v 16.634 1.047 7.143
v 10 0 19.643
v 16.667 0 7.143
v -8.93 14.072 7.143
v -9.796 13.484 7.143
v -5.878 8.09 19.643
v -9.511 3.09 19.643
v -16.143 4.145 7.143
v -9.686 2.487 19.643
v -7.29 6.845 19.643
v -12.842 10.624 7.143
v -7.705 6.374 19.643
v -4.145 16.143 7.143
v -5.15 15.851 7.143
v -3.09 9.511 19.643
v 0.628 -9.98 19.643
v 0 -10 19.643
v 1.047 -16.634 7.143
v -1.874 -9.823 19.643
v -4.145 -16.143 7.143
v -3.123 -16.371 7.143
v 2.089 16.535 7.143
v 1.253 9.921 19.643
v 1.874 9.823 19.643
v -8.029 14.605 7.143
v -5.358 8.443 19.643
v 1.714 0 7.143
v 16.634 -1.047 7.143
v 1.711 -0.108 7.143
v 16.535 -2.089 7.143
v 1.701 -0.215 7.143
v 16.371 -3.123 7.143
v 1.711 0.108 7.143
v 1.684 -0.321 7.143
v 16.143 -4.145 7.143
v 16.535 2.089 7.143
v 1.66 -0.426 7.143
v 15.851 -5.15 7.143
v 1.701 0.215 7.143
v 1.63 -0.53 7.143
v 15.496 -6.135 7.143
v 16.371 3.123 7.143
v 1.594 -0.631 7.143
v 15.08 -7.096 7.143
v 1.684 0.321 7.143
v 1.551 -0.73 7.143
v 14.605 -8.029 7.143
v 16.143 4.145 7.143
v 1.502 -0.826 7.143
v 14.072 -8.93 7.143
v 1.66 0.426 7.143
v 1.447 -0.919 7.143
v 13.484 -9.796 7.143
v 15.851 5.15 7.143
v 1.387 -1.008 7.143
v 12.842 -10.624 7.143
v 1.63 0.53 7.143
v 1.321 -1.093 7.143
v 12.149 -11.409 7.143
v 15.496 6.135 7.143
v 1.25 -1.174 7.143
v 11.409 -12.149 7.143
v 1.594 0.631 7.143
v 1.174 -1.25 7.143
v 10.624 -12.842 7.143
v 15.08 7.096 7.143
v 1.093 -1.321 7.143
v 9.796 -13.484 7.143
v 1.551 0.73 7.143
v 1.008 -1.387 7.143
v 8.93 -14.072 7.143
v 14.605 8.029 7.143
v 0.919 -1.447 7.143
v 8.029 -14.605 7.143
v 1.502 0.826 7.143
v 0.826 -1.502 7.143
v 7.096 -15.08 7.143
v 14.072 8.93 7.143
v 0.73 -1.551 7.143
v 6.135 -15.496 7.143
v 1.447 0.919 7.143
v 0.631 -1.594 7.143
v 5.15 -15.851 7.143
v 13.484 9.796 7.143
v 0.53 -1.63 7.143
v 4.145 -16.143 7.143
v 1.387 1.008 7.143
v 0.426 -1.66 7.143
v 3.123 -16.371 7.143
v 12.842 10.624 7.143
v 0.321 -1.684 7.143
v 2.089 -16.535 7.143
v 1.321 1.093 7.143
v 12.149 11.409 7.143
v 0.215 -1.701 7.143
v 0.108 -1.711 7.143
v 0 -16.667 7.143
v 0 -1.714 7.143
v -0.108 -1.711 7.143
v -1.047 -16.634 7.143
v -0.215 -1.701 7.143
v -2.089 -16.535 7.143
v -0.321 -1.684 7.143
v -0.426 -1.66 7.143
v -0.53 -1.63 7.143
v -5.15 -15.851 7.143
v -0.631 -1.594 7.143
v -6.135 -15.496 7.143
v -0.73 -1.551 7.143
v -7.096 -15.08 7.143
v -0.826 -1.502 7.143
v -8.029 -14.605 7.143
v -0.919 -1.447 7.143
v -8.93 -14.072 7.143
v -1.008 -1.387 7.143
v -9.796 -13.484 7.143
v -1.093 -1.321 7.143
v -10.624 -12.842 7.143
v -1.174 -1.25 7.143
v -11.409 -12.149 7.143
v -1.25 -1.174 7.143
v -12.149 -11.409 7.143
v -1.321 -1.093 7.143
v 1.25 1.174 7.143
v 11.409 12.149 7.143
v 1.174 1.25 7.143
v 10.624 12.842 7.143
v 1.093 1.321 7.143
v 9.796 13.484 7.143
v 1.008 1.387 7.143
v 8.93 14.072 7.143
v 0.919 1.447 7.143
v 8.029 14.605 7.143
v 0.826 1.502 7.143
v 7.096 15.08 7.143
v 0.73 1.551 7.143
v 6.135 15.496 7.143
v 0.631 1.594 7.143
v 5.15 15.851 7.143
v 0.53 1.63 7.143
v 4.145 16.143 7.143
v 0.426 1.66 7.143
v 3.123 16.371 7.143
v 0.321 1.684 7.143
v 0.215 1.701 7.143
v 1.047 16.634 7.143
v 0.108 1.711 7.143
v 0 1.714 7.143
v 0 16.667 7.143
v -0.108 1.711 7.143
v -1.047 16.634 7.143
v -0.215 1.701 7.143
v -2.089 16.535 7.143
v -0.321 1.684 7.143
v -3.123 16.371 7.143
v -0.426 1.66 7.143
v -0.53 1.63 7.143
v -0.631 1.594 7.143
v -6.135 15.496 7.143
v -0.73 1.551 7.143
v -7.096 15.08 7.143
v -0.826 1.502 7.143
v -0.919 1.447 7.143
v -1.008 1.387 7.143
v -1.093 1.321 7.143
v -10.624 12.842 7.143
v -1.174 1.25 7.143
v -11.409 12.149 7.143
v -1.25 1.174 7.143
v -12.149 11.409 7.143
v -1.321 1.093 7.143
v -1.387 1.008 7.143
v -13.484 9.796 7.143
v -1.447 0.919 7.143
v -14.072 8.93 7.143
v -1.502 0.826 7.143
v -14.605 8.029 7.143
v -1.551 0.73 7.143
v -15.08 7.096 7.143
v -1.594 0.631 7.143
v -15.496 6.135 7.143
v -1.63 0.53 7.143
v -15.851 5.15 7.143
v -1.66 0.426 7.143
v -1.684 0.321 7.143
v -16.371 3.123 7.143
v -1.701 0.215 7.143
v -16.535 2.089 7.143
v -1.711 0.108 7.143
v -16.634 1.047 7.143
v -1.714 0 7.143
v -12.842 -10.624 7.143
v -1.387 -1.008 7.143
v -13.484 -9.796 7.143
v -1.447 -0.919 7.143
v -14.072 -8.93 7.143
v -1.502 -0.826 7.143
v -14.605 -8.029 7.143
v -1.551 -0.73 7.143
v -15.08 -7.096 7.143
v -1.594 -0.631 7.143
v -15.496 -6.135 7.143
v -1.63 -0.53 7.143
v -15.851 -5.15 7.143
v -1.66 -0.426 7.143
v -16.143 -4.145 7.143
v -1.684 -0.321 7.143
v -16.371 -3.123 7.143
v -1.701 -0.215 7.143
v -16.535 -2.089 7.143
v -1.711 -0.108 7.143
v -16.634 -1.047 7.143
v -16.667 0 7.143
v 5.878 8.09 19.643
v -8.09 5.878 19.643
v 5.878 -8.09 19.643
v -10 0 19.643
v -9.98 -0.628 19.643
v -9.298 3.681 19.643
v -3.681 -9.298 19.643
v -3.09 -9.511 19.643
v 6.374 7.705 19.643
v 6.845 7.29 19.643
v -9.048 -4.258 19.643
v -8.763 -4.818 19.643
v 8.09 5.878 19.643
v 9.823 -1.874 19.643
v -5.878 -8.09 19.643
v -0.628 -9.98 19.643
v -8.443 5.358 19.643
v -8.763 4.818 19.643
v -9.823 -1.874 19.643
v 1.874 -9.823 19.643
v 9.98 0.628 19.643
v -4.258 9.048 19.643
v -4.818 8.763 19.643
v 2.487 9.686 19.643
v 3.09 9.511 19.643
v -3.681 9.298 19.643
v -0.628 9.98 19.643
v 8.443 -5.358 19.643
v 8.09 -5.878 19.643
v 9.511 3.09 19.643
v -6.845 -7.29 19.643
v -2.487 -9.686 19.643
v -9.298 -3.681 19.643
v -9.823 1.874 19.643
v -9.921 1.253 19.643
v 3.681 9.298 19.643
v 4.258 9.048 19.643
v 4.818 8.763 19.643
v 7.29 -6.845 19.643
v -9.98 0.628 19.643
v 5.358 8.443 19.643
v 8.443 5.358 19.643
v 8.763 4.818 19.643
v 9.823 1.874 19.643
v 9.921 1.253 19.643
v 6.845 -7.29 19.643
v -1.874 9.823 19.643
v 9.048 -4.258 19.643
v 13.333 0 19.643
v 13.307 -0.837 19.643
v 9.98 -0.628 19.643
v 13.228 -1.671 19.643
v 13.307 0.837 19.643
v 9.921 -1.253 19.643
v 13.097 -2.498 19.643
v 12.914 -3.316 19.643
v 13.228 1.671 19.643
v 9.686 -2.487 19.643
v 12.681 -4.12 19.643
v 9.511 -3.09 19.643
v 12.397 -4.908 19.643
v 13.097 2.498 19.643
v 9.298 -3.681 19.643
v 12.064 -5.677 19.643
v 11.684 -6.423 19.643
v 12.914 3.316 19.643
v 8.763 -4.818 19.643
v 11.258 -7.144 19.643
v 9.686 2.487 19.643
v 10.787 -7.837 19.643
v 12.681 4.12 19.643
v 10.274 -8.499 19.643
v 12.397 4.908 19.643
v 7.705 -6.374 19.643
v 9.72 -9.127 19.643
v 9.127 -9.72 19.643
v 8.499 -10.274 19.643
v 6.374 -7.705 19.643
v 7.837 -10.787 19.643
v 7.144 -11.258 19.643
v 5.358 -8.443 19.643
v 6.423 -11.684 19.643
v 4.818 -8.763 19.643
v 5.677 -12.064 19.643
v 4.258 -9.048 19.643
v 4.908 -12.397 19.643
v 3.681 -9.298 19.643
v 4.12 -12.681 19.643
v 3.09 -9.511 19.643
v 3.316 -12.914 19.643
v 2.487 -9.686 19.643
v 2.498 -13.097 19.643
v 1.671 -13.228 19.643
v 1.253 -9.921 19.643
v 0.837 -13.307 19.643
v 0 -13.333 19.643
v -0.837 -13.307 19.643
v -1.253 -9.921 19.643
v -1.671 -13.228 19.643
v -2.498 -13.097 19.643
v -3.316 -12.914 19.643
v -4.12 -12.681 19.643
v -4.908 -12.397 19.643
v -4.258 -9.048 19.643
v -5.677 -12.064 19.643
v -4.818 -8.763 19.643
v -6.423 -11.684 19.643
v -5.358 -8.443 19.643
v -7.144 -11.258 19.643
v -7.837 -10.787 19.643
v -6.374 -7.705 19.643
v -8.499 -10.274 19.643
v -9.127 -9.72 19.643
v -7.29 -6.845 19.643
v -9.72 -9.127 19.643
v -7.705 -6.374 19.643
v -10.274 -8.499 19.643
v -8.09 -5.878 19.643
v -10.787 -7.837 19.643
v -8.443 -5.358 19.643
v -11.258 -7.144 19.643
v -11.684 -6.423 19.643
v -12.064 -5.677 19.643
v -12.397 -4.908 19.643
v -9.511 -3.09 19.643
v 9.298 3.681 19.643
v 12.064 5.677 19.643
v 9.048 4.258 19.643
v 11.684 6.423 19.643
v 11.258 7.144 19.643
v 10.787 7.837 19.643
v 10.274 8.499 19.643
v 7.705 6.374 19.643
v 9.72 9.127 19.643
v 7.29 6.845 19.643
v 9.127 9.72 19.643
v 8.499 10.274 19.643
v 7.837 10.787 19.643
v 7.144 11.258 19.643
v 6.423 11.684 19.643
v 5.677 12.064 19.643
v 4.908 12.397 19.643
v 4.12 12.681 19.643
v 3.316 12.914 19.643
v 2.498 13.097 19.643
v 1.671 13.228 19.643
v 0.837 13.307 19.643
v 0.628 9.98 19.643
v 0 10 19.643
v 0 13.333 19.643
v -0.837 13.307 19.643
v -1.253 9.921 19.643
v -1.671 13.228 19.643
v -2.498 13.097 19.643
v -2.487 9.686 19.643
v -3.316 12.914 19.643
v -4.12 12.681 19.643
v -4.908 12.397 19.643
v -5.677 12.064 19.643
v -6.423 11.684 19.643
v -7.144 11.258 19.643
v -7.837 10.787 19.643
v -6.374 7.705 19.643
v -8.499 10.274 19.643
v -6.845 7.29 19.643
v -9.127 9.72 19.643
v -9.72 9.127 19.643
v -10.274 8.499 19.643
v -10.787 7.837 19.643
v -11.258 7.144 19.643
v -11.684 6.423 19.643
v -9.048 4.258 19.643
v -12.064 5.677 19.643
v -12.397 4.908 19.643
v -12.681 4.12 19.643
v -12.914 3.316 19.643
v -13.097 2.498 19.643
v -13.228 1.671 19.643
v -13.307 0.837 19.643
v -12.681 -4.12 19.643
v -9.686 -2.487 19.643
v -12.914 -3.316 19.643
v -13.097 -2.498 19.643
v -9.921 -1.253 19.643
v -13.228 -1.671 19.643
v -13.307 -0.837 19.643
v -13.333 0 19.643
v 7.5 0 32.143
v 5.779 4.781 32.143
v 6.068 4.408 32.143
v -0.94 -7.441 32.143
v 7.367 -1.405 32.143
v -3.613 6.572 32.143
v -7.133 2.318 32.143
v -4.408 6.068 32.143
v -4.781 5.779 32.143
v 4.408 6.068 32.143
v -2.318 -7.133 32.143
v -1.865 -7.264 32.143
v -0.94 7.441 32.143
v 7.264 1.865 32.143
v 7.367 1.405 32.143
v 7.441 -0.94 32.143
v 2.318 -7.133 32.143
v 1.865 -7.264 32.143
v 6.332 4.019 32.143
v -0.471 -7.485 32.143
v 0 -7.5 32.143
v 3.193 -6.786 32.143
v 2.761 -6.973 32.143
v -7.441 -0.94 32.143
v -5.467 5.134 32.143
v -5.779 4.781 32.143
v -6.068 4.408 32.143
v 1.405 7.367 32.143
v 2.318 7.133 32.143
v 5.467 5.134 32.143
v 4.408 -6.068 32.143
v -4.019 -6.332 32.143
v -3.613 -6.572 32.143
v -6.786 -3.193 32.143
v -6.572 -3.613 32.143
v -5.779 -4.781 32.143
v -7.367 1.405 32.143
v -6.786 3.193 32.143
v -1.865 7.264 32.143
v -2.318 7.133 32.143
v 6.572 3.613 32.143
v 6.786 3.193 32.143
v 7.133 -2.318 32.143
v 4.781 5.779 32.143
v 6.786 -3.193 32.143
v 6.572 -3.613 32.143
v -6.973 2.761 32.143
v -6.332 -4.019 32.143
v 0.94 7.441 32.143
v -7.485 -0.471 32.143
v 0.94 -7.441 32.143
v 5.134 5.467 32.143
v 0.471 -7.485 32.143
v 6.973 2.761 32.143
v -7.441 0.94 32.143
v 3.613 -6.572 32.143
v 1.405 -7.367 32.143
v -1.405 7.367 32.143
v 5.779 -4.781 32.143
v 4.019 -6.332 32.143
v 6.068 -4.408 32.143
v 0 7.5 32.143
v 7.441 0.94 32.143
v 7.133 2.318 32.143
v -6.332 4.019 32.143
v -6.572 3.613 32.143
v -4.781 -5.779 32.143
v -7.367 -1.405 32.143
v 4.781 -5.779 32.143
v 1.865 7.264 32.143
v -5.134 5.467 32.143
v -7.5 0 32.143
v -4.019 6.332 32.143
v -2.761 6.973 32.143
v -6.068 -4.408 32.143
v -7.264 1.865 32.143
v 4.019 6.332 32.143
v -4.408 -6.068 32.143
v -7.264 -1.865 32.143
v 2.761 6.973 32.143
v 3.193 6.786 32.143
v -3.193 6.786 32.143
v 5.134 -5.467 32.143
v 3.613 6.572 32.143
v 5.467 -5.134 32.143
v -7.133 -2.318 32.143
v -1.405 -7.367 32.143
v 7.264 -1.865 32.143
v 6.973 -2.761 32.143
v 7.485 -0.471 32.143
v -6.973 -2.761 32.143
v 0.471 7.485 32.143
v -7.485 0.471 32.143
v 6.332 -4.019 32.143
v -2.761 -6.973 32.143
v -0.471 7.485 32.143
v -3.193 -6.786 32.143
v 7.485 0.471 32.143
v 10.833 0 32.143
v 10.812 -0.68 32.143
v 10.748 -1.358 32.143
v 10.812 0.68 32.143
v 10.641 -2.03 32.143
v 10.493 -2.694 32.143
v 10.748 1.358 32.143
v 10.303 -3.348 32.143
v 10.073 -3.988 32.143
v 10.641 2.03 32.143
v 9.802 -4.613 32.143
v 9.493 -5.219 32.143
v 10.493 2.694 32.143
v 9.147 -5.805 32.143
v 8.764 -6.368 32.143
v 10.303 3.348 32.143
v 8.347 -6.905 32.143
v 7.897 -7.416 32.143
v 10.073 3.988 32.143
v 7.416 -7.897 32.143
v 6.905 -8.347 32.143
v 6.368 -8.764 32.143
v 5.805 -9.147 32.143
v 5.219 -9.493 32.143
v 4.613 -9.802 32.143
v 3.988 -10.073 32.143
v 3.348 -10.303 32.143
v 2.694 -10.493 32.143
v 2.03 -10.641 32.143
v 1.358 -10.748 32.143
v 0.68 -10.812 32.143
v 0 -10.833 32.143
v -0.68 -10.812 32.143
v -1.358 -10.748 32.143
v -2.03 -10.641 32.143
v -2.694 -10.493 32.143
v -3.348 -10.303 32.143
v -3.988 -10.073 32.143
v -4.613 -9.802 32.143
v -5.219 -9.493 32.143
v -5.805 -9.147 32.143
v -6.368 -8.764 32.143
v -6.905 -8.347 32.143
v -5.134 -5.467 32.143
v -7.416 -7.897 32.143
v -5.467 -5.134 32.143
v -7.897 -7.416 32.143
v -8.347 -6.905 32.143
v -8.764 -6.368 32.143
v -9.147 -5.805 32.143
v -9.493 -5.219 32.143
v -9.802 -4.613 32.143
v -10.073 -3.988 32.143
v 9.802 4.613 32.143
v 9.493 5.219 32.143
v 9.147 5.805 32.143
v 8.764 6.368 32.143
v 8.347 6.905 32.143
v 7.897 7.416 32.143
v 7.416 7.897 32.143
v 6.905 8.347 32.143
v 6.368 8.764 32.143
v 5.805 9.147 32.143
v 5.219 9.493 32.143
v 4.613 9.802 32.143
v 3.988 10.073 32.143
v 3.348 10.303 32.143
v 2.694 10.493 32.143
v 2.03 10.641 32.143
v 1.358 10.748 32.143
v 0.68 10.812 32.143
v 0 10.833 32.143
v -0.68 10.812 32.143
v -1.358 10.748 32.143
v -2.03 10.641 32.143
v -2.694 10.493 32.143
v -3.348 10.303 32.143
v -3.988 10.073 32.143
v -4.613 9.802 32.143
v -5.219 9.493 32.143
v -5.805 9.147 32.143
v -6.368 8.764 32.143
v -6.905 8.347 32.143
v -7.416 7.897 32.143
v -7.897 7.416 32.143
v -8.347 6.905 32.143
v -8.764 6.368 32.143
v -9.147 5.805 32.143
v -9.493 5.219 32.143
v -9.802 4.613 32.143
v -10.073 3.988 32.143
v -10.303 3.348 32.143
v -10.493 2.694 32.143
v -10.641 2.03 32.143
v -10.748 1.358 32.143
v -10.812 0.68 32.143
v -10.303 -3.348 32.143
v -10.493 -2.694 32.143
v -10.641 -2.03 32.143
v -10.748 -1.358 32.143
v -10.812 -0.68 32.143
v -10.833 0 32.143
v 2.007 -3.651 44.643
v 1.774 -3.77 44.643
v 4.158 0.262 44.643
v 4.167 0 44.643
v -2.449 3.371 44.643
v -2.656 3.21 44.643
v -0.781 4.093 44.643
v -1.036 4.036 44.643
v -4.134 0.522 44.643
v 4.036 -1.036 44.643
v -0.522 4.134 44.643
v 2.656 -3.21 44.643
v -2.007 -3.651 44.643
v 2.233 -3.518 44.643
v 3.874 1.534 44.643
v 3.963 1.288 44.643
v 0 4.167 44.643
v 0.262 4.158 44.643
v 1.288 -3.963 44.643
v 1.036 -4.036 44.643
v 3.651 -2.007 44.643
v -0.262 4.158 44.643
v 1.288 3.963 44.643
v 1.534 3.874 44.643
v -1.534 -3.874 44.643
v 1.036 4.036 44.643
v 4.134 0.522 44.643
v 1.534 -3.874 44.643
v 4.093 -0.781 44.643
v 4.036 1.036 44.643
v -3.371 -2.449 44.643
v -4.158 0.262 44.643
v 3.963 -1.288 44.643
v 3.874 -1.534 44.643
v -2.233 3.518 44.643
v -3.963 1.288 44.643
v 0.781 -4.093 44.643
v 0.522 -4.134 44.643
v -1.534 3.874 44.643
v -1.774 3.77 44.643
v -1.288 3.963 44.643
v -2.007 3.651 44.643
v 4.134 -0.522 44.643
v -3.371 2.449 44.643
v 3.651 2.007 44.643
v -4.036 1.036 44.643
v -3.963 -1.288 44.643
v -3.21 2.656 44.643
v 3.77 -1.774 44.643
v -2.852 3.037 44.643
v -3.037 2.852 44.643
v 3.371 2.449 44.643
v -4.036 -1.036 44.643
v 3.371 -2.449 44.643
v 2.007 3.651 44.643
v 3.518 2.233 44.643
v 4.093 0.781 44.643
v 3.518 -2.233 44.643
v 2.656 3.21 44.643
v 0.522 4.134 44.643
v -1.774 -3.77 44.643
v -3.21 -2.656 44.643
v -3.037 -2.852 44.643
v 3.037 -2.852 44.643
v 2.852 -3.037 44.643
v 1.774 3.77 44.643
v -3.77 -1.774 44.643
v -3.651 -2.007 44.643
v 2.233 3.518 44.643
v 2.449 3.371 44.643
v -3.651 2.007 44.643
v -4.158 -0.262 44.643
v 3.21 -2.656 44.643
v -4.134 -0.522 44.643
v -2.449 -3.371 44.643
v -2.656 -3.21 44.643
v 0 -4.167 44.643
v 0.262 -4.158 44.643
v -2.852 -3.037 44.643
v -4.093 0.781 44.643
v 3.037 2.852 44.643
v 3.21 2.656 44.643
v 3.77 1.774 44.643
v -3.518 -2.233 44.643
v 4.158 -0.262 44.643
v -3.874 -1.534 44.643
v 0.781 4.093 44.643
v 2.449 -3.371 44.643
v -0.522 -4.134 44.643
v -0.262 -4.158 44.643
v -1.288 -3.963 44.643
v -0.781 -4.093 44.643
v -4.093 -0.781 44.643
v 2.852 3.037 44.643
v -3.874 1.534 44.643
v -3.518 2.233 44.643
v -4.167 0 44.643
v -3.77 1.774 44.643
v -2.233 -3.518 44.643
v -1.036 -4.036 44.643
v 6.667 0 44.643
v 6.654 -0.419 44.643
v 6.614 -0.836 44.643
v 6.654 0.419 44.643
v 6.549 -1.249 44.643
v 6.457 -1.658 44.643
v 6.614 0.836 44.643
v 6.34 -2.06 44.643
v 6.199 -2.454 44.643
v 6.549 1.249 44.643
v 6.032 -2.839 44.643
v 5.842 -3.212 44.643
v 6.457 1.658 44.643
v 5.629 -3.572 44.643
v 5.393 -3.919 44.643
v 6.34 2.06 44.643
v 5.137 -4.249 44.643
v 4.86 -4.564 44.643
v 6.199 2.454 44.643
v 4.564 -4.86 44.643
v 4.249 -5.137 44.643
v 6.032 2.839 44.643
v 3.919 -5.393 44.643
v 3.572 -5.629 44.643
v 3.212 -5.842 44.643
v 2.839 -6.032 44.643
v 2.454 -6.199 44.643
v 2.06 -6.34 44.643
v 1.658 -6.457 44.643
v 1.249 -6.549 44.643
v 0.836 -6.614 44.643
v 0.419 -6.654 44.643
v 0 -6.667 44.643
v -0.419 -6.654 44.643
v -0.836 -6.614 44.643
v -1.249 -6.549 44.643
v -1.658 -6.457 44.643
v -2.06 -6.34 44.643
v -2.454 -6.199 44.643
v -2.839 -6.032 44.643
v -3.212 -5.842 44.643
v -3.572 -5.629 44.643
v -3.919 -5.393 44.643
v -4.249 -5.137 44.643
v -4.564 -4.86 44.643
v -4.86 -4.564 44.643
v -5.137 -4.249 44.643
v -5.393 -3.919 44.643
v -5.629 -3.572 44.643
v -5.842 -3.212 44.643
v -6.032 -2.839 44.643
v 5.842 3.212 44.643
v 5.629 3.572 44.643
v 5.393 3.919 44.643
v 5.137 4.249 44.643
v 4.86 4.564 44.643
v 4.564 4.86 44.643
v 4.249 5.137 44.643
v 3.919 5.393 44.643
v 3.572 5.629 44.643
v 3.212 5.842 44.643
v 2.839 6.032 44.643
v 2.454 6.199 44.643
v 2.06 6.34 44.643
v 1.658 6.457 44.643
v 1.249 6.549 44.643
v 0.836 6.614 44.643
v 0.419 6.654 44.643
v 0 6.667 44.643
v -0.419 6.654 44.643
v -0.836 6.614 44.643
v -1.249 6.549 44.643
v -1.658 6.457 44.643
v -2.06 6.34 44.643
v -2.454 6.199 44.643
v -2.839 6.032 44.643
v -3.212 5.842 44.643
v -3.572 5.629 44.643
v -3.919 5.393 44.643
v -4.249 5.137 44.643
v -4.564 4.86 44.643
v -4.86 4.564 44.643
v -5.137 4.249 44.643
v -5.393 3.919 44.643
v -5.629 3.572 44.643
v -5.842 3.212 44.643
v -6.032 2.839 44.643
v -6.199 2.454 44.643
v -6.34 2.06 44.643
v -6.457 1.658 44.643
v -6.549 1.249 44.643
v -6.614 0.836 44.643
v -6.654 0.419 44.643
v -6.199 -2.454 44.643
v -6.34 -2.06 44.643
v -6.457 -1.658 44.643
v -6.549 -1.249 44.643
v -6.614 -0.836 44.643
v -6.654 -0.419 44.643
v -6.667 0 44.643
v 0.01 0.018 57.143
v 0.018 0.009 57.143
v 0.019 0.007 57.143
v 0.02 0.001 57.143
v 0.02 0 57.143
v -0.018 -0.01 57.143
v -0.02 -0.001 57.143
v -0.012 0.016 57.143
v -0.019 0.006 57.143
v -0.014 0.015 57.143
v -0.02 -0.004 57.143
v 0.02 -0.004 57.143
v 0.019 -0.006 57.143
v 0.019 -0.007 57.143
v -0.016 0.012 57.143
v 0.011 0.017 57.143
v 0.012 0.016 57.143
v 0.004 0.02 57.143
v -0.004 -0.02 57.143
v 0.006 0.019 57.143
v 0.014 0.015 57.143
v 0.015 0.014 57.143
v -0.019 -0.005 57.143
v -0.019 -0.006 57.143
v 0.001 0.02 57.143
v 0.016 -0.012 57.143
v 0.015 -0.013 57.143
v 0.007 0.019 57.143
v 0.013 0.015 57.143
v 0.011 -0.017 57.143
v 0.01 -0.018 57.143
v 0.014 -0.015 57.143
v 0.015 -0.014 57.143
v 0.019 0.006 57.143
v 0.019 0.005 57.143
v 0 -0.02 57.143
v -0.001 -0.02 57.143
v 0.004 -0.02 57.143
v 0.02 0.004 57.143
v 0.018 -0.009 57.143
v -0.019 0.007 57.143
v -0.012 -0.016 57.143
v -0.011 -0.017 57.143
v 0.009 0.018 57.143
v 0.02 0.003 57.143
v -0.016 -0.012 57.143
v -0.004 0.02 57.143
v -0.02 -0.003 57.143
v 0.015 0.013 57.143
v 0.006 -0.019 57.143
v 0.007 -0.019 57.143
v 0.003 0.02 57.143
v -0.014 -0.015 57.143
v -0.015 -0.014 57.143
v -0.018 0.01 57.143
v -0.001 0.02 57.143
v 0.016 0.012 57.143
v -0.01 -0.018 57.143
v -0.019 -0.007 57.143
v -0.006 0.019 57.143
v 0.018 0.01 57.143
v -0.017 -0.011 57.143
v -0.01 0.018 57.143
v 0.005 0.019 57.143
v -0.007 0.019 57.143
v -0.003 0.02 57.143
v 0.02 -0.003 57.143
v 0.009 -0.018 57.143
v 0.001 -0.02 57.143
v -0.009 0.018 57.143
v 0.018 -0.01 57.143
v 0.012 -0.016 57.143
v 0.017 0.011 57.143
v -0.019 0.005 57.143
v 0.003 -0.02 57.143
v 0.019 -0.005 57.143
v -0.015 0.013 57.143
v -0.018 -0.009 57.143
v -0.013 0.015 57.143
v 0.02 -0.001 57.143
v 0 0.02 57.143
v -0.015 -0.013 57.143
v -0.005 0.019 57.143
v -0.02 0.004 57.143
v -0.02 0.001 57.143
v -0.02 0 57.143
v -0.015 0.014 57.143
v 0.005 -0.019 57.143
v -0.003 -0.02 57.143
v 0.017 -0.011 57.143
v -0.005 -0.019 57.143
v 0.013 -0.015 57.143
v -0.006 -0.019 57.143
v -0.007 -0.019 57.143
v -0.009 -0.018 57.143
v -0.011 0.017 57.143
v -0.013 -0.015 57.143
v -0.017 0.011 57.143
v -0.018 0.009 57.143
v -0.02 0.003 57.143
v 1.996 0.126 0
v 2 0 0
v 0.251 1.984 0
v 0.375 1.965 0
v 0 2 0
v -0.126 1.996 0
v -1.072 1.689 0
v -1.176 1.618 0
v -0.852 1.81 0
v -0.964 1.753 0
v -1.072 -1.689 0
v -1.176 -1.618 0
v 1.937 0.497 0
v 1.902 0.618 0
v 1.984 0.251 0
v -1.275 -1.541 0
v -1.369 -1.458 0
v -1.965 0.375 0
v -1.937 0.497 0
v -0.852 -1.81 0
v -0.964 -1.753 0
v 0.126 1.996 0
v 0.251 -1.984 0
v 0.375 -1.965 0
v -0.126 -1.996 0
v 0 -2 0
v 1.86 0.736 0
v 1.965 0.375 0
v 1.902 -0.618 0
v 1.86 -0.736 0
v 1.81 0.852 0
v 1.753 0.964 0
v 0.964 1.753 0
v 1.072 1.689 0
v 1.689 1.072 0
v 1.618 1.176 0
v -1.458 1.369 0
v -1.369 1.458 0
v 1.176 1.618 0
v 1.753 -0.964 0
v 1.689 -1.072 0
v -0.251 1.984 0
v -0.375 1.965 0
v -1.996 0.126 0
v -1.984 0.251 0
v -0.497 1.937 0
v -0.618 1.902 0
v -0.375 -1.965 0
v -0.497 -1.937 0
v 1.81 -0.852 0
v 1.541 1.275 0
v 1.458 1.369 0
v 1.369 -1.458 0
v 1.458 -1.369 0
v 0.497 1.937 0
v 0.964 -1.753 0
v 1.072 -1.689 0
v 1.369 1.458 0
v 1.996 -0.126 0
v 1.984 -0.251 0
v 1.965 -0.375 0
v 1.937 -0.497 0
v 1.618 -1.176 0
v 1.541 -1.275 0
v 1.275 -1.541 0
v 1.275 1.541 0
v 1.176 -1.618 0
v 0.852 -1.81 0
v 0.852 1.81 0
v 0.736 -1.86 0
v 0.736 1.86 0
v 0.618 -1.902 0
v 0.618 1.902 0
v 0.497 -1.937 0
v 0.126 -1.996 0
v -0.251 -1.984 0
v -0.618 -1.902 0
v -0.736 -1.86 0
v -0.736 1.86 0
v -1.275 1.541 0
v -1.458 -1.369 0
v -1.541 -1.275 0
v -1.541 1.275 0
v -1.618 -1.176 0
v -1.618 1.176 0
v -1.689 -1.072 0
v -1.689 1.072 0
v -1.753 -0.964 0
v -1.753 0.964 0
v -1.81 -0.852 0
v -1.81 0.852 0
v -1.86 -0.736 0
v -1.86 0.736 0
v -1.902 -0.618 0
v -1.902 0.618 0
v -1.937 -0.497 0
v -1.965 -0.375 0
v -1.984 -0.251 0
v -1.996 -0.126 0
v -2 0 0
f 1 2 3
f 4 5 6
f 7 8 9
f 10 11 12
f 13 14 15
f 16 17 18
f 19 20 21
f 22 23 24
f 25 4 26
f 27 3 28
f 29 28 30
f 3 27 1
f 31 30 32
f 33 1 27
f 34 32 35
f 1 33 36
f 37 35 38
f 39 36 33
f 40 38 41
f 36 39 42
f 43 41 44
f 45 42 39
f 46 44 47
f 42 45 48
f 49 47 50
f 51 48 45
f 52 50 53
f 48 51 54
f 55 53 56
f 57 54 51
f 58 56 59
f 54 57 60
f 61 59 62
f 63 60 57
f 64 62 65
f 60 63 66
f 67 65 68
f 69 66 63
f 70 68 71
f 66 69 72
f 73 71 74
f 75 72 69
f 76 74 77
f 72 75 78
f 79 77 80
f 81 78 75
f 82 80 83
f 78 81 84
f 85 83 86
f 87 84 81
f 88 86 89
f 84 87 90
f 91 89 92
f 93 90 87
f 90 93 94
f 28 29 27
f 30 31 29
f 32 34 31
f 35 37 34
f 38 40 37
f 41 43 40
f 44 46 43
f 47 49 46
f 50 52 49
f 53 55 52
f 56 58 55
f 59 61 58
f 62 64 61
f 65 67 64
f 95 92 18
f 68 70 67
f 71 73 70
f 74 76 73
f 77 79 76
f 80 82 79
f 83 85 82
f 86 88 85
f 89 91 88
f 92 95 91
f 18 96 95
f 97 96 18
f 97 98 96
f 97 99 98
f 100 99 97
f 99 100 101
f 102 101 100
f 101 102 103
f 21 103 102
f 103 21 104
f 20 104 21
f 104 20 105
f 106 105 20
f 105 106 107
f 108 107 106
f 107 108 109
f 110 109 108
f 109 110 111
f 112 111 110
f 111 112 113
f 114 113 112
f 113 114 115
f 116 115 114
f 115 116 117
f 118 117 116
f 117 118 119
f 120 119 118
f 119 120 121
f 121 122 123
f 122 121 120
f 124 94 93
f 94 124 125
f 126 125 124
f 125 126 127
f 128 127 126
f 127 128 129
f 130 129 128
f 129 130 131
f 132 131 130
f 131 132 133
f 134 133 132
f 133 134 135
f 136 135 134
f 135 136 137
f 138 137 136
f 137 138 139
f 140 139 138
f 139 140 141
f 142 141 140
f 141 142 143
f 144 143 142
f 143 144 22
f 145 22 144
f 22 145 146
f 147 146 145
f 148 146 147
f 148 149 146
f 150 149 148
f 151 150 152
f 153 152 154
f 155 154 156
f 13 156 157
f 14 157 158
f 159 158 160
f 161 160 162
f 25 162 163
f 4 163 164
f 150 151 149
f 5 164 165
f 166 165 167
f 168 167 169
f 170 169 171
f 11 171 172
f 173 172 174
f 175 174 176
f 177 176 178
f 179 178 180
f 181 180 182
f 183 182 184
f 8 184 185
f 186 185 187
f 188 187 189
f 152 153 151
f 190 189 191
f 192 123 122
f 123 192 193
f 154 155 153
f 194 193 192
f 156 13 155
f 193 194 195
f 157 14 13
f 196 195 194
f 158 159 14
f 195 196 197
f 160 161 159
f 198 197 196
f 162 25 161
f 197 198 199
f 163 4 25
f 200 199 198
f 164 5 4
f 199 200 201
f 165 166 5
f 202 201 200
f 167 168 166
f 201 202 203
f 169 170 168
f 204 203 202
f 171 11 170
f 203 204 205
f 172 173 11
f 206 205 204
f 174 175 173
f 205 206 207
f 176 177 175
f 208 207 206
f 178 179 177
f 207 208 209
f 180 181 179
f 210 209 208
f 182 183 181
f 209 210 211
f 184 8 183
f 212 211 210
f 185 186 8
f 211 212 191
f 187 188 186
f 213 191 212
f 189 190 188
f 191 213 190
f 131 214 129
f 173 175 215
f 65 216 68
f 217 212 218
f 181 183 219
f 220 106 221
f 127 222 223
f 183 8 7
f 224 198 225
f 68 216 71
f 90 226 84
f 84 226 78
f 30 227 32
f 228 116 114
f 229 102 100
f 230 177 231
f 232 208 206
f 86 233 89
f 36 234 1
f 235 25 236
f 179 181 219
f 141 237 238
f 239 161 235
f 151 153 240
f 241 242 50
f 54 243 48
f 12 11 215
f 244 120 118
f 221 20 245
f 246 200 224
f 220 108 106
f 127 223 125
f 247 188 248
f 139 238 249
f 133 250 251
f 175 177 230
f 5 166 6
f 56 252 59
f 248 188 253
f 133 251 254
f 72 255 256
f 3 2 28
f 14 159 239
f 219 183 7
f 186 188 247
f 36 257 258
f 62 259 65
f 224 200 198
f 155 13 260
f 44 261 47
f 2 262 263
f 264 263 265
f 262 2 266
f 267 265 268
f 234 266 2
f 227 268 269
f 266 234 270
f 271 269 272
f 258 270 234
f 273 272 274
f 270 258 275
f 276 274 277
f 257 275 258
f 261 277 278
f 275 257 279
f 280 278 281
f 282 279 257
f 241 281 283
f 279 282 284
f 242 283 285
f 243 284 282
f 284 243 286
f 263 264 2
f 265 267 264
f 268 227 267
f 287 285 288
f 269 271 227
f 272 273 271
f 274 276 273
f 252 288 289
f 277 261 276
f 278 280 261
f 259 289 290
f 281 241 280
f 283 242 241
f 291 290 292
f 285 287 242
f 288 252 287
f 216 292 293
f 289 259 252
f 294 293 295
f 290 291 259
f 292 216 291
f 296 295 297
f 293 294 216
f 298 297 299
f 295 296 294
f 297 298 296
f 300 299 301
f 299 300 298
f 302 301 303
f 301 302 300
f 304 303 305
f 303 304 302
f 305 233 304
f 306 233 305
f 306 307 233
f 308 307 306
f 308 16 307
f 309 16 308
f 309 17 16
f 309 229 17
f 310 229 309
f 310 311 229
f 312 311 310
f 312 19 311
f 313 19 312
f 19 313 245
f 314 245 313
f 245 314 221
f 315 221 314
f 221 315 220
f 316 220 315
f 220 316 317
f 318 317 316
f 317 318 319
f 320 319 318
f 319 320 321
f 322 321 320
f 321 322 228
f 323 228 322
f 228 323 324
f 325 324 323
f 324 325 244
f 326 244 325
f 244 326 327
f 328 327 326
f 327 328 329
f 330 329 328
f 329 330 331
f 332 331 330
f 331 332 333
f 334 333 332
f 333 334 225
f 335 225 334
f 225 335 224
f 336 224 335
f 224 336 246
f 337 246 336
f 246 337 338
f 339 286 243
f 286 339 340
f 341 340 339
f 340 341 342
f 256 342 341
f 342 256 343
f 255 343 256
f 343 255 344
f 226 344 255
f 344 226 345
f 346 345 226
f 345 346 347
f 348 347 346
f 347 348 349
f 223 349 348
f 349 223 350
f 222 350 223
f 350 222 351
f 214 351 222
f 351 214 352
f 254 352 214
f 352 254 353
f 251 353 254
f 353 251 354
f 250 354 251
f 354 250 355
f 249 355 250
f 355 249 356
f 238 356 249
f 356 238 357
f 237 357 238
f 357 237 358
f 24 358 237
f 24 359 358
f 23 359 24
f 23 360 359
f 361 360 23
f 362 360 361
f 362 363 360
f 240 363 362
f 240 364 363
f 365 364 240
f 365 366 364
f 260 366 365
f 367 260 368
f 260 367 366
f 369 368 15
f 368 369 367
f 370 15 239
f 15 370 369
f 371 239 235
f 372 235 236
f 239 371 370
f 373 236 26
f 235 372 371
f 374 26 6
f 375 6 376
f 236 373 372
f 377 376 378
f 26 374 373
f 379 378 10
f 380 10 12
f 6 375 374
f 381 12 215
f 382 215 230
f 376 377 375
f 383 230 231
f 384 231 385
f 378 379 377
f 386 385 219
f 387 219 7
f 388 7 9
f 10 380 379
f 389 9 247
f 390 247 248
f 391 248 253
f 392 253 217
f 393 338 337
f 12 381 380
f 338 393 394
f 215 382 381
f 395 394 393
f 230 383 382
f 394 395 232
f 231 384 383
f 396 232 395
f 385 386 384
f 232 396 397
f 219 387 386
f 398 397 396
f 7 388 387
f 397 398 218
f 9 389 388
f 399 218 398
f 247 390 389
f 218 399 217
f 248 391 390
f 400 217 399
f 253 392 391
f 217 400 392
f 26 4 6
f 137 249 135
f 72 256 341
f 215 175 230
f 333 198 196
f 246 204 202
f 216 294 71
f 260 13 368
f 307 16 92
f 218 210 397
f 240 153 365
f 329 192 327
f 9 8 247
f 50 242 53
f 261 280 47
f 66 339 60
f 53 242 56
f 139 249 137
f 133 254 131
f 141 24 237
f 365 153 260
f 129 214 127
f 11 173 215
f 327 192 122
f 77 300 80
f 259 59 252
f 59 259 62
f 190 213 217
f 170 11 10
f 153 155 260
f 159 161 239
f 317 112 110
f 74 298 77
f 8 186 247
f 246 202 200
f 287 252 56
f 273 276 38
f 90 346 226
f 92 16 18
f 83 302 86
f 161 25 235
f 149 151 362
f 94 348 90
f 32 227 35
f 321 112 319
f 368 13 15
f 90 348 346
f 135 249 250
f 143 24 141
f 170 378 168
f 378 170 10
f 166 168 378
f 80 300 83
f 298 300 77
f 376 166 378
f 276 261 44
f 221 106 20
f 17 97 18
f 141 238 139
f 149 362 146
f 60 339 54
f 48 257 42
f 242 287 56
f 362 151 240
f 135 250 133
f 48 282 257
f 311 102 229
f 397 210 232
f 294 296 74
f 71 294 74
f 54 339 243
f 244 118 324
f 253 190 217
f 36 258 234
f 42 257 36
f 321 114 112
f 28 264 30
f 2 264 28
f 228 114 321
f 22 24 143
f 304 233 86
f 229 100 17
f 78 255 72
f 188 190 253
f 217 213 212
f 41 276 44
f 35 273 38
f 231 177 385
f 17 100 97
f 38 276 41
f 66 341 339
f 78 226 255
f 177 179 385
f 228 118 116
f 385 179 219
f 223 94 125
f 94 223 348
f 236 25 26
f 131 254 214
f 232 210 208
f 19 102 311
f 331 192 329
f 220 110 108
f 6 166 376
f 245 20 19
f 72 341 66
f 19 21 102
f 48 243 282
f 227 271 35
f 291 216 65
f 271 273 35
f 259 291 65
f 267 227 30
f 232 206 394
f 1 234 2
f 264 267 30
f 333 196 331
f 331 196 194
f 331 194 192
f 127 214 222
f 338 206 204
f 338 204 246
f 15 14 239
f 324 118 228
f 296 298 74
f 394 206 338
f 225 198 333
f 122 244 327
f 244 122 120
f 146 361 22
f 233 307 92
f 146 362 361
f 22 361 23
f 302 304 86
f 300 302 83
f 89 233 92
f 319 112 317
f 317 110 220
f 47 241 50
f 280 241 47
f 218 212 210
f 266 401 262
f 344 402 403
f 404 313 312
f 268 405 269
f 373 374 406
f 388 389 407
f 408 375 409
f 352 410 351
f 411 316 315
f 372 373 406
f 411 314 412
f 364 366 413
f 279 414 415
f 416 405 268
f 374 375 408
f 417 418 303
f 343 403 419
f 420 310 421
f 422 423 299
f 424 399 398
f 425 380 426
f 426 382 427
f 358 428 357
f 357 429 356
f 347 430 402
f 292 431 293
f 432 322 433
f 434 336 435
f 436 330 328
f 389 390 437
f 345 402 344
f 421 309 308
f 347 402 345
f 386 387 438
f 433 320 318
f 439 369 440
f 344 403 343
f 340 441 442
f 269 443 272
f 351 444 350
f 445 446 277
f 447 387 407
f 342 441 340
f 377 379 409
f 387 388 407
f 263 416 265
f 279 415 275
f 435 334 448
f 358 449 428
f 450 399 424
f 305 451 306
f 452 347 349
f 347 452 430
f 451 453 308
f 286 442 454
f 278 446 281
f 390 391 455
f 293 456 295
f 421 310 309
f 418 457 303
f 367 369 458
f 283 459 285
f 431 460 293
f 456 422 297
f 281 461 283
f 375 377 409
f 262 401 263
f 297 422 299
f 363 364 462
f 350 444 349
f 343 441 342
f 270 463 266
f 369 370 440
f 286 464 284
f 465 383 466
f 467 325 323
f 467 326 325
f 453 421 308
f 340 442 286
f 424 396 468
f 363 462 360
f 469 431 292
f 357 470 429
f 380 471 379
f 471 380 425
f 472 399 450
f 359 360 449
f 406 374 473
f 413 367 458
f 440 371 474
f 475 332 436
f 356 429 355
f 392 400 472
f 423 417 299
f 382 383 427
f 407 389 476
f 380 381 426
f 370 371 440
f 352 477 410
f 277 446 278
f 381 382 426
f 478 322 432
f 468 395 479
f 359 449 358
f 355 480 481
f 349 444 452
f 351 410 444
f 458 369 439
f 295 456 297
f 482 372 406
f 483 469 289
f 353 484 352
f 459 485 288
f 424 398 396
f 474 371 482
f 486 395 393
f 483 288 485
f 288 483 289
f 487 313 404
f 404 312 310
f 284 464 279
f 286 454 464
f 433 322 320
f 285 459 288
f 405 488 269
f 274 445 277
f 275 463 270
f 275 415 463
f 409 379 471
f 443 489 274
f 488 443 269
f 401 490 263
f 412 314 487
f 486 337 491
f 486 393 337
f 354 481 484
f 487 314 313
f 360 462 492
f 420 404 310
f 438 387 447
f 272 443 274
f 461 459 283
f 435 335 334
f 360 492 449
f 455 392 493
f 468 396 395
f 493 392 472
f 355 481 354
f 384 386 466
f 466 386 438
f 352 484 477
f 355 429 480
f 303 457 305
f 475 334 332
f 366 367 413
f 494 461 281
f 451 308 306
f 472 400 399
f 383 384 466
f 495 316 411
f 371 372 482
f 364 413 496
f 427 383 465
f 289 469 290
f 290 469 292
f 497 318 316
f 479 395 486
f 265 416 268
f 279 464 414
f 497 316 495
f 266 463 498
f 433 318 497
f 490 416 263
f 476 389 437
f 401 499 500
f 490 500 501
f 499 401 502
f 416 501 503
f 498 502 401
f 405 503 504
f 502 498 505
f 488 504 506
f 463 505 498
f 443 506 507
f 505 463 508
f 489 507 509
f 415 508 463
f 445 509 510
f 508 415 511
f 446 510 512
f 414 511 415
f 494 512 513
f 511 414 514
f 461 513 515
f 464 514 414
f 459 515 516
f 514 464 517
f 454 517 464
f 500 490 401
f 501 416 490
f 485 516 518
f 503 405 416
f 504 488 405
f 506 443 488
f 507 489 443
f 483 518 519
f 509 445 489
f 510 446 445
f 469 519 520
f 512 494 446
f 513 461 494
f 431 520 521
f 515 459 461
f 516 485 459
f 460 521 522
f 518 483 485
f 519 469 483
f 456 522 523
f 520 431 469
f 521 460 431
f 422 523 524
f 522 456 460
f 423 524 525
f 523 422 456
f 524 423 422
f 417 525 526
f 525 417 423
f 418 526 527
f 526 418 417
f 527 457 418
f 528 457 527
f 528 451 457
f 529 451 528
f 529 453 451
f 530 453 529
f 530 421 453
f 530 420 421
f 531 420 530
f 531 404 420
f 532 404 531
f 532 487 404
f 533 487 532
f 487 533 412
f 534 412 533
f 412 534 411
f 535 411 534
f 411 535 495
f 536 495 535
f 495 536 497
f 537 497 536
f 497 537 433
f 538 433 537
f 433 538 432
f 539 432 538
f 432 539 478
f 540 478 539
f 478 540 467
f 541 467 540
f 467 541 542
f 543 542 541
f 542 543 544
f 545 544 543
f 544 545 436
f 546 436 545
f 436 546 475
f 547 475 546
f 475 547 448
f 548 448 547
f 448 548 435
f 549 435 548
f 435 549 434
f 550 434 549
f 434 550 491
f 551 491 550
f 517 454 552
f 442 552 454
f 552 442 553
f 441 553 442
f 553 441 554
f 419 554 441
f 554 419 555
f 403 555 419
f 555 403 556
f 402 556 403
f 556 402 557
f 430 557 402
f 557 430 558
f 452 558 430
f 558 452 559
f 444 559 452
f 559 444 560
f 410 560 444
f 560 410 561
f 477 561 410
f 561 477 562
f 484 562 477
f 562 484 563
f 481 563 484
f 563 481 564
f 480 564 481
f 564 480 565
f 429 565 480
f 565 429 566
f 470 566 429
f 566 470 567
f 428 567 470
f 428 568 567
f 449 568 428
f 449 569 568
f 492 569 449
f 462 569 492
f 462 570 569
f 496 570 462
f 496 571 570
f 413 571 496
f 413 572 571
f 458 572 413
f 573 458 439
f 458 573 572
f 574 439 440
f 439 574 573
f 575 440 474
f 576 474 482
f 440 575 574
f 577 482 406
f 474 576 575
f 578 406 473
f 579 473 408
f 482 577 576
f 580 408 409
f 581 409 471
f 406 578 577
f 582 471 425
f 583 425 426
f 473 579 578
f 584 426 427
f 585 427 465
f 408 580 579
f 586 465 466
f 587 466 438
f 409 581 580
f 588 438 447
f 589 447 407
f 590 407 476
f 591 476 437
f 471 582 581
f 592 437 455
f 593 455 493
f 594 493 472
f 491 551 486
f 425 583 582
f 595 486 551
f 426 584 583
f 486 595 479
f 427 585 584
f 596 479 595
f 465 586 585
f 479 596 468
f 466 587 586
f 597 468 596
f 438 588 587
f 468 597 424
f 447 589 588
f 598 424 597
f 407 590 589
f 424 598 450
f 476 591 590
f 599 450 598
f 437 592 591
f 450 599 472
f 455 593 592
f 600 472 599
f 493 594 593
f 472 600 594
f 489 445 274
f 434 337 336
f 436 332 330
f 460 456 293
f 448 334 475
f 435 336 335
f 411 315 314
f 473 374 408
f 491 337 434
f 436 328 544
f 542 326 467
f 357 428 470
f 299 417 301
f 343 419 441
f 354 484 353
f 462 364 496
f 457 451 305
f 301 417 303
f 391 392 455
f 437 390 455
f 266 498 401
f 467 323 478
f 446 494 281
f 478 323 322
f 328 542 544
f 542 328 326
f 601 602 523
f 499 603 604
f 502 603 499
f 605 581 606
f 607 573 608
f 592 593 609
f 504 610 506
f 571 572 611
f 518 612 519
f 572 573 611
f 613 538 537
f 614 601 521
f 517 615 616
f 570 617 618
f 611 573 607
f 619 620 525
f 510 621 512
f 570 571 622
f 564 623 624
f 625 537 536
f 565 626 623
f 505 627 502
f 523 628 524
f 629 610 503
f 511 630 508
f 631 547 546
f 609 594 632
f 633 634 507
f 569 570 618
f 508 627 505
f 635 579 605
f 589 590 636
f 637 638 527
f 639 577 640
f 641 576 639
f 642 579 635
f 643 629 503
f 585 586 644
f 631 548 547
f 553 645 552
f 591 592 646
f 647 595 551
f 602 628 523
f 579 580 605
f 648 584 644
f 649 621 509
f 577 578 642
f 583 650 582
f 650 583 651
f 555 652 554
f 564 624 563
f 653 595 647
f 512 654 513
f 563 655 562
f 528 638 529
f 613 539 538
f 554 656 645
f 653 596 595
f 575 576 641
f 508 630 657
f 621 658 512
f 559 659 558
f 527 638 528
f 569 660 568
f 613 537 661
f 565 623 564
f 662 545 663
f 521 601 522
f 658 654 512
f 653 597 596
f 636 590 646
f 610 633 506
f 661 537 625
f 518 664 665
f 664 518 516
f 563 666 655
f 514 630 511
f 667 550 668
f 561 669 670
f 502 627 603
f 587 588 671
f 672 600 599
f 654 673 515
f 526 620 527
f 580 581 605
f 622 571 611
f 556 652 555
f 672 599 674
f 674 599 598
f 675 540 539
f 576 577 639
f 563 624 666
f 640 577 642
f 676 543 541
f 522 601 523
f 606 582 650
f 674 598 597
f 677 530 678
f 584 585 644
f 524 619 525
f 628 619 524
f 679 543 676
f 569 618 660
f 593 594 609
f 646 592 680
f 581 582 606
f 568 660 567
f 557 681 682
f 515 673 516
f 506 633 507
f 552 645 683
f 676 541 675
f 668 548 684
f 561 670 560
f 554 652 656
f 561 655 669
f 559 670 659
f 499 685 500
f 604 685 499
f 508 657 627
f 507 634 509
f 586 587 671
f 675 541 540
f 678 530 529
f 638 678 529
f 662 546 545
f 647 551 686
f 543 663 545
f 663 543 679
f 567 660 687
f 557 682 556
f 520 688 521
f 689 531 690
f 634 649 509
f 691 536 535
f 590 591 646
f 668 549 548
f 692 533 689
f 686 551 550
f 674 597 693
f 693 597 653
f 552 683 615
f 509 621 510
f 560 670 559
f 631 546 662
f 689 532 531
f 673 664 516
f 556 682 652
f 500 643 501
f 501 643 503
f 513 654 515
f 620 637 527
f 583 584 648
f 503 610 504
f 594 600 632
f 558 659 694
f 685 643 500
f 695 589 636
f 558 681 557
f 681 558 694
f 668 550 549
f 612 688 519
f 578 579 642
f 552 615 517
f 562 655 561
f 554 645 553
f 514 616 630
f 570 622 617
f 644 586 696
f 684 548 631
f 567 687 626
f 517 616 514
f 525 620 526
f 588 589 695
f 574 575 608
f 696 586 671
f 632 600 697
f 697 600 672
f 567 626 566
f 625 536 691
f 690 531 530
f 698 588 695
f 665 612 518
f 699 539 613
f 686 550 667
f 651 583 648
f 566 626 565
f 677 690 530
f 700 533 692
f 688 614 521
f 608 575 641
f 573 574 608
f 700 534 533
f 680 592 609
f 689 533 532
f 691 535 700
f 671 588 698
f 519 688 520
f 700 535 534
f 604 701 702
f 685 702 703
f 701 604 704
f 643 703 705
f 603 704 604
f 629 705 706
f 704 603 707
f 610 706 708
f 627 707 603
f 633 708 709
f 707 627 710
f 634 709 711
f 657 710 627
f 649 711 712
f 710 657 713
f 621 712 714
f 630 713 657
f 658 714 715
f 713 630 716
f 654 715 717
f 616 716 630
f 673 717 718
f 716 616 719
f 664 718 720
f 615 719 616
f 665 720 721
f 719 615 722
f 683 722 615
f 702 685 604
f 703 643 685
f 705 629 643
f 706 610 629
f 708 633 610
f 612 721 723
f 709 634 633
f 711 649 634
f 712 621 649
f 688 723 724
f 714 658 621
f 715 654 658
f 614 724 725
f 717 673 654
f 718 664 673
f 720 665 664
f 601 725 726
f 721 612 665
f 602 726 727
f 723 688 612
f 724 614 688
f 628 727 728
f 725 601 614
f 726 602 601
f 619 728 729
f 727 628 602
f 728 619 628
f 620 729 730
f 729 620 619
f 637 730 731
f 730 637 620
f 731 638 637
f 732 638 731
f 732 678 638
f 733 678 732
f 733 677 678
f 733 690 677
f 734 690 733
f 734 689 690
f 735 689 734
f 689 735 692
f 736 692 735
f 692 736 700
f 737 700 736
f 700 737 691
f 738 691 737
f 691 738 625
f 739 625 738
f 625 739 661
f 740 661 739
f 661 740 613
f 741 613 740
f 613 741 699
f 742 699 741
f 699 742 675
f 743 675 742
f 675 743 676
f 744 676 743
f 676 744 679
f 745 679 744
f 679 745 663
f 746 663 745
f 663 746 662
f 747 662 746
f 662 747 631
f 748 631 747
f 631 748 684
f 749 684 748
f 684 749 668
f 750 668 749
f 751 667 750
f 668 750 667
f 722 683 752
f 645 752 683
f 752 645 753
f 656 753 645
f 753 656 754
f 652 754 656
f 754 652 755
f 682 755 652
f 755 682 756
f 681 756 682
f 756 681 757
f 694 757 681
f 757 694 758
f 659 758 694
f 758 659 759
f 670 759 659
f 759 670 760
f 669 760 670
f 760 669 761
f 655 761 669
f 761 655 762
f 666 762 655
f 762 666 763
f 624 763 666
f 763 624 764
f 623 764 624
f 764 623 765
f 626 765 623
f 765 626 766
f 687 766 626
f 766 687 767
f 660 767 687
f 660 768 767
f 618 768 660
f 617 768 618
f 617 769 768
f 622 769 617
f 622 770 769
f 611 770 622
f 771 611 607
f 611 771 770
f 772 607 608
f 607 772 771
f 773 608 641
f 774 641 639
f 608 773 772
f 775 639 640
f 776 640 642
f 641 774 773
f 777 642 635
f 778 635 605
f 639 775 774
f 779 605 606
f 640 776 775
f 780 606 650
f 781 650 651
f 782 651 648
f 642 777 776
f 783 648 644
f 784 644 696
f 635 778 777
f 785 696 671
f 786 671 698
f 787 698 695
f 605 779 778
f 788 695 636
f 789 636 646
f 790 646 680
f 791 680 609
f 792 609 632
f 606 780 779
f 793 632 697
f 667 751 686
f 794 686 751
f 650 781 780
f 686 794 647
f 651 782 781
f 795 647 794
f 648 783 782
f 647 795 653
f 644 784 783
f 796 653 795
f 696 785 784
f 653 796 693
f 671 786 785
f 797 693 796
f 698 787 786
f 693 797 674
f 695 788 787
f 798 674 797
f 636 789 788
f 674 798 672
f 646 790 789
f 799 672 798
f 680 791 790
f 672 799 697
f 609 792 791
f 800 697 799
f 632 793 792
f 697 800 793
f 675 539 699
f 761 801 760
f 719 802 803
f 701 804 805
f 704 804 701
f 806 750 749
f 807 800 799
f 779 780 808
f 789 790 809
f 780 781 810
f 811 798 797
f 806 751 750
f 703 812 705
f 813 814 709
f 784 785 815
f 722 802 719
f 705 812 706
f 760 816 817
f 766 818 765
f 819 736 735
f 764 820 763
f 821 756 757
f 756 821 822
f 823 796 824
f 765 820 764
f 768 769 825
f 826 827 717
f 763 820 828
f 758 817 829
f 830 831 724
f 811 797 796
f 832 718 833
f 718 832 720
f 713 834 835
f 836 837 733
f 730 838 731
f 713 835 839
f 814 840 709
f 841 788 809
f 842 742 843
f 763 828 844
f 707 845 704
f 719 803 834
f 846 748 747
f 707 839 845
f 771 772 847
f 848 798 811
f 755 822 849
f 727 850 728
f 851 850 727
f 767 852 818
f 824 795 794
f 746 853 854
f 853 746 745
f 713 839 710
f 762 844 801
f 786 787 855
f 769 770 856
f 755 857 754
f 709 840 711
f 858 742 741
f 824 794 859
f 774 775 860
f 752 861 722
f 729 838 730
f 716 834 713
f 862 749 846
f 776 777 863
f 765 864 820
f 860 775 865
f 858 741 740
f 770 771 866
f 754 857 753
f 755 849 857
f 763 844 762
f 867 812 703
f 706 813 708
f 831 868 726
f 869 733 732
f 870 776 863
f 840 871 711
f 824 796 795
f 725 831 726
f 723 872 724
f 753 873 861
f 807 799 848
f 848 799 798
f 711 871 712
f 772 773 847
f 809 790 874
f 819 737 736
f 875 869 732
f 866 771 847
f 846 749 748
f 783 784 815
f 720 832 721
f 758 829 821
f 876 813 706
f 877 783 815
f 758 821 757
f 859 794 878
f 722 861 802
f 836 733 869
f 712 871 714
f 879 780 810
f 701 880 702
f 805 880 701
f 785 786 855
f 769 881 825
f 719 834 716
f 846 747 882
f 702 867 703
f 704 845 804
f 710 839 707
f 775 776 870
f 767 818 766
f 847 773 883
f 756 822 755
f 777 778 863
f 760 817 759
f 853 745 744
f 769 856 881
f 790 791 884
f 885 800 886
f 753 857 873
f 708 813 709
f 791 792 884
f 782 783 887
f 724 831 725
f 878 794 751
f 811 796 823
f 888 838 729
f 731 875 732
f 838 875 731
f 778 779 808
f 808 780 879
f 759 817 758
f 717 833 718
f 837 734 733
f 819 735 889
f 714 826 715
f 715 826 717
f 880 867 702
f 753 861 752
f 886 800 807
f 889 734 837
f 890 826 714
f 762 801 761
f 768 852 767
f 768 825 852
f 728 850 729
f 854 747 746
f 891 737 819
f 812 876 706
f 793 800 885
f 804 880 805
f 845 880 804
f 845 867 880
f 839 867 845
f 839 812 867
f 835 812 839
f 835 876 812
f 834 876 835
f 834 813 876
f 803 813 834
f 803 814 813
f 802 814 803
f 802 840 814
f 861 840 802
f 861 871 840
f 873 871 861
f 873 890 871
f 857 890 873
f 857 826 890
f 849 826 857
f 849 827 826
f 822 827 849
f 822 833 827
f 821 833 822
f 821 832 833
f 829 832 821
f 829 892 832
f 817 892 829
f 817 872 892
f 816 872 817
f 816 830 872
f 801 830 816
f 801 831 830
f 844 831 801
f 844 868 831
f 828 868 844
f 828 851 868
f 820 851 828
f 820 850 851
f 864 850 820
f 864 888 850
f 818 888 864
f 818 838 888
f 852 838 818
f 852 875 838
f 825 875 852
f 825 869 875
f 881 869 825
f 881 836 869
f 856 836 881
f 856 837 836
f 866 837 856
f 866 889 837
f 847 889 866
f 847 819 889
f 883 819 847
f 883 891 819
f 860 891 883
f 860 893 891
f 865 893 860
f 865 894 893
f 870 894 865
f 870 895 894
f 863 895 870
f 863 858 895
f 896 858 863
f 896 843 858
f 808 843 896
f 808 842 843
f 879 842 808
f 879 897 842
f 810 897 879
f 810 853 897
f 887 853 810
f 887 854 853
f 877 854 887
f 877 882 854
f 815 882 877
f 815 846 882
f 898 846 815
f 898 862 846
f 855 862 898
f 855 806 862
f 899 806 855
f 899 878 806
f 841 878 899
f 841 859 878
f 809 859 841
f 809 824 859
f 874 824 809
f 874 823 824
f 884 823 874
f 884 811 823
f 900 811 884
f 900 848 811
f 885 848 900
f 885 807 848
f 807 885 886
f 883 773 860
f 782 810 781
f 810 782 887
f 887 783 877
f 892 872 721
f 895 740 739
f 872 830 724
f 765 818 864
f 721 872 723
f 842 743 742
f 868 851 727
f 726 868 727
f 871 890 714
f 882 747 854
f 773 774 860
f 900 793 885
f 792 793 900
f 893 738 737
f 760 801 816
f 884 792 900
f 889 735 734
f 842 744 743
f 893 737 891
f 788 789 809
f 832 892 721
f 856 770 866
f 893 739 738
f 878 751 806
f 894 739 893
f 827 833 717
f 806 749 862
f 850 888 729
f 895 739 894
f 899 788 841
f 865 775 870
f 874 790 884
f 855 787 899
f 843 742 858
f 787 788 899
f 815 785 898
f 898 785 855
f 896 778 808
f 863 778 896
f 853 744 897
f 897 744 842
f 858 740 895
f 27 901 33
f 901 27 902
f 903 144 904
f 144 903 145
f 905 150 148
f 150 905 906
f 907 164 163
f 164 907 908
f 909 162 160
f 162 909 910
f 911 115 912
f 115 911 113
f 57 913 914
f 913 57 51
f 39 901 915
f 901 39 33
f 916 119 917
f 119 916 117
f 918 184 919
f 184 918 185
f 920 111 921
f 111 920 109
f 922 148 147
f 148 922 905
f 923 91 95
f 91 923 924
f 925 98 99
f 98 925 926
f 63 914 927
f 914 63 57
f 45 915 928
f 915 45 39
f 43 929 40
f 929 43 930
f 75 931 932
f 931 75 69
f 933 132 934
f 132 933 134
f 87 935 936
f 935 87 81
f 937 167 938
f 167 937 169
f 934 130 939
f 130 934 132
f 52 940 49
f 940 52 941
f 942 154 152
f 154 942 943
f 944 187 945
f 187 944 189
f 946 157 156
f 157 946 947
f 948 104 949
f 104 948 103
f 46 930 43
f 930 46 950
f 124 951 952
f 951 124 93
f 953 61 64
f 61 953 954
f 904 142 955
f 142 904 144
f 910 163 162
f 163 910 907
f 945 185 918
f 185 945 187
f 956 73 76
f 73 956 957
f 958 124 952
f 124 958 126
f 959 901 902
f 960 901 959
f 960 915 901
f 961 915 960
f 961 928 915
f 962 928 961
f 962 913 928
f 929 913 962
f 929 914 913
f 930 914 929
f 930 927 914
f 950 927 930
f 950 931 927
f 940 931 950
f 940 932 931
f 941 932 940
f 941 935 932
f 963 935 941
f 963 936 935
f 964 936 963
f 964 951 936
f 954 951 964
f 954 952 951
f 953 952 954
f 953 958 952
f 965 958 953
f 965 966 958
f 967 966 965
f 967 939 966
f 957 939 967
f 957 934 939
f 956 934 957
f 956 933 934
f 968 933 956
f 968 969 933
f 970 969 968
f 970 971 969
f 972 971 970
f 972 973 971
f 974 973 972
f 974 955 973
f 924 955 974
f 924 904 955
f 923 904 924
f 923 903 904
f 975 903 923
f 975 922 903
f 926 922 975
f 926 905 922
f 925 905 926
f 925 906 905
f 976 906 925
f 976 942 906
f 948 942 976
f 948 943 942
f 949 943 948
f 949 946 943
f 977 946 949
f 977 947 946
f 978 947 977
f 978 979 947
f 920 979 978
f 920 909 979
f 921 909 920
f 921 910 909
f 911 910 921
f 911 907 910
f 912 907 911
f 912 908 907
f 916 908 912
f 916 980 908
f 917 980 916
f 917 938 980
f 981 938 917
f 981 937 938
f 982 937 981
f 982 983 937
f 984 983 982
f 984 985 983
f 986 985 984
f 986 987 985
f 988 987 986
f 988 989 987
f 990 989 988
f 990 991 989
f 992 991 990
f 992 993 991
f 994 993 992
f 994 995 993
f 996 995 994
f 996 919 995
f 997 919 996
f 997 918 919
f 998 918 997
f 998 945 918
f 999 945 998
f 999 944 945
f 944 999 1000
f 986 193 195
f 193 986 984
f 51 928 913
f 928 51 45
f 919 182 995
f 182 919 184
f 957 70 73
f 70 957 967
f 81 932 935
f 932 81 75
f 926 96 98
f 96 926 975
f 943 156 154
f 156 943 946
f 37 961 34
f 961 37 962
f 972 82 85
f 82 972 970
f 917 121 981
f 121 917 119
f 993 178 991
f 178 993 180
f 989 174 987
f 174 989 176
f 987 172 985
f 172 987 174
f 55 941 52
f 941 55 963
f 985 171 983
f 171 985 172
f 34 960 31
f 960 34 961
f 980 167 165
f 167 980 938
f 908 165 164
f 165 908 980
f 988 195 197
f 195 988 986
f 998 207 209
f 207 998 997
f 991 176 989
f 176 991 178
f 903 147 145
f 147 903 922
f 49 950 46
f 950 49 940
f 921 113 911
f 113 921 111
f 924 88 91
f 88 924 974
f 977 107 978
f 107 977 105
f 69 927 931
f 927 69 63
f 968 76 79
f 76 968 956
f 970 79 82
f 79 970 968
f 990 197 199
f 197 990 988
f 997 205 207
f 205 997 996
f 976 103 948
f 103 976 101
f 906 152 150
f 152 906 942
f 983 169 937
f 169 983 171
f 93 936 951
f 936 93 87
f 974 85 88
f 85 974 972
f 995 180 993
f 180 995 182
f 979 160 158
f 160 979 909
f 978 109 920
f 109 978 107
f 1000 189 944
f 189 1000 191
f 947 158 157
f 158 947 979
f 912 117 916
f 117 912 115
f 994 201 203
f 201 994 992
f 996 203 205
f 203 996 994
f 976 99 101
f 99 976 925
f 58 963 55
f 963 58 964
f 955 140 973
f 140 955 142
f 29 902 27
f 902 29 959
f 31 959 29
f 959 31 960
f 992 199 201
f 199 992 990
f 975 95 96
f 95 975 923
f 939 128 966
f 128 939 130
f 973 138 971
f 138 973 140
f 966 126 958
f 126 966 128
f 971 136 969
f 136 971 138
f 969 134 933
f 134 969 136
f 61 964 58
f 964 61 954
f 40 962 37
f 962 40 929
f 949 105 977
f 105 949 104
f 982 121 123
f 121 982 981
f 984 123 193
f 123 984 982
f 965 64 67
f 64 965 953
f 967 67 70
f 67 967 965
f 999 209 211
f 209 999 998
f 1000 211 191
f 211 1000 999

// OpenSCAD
/* 
Christmas Tree with Star in the top
Author: Xiaoqi Zhao
Date: 2022-12-05
Type of tree:
  1 - complex, single shape
  2 - simple, single shape
  3 - simple, four layers
*/

module christmasTree(type,height) {
    // e.g. type = 2, height = 50
    color("brown"){
    cylinder(height,2,0);
    }
    if (type==1) {
        color("green") {
        for (i=[5:0.5:height]) {
            length = height-i;
            for (j=[i*5:25:355+i*5]) {
                translate([0,0,i])
                rotate([0,85,j]) cylinder(length/2.5,0.2,0.2);
                }
            }
        }
    }
    else if (type==2) {
        color("green") {
            translate([0,0,height/7])
            cylinder(height*9/10,height/3,0.2);
            }
        }
    else if (type==3) {
        color("green") {
            translate([0,0,height/7]) {
                layerHeight = height/4;
                cylinder(layerHeight,height/3,height/3*0.6);
                translate([0,0,layerHeight]) cylinder(layerHeight,height/3*0.8,height/3*0.45);
                translate([0,0,layerHeight*2]) cylinder(layerHeight,height/3*0.65,height/3*0.25);
                translate([0,0,layerHeight*3]) cylinder(layerHeight,height/3*0.4,0.02);
            }
        }
    }
}
    
$fn=100;
christmasTree(3,50);
